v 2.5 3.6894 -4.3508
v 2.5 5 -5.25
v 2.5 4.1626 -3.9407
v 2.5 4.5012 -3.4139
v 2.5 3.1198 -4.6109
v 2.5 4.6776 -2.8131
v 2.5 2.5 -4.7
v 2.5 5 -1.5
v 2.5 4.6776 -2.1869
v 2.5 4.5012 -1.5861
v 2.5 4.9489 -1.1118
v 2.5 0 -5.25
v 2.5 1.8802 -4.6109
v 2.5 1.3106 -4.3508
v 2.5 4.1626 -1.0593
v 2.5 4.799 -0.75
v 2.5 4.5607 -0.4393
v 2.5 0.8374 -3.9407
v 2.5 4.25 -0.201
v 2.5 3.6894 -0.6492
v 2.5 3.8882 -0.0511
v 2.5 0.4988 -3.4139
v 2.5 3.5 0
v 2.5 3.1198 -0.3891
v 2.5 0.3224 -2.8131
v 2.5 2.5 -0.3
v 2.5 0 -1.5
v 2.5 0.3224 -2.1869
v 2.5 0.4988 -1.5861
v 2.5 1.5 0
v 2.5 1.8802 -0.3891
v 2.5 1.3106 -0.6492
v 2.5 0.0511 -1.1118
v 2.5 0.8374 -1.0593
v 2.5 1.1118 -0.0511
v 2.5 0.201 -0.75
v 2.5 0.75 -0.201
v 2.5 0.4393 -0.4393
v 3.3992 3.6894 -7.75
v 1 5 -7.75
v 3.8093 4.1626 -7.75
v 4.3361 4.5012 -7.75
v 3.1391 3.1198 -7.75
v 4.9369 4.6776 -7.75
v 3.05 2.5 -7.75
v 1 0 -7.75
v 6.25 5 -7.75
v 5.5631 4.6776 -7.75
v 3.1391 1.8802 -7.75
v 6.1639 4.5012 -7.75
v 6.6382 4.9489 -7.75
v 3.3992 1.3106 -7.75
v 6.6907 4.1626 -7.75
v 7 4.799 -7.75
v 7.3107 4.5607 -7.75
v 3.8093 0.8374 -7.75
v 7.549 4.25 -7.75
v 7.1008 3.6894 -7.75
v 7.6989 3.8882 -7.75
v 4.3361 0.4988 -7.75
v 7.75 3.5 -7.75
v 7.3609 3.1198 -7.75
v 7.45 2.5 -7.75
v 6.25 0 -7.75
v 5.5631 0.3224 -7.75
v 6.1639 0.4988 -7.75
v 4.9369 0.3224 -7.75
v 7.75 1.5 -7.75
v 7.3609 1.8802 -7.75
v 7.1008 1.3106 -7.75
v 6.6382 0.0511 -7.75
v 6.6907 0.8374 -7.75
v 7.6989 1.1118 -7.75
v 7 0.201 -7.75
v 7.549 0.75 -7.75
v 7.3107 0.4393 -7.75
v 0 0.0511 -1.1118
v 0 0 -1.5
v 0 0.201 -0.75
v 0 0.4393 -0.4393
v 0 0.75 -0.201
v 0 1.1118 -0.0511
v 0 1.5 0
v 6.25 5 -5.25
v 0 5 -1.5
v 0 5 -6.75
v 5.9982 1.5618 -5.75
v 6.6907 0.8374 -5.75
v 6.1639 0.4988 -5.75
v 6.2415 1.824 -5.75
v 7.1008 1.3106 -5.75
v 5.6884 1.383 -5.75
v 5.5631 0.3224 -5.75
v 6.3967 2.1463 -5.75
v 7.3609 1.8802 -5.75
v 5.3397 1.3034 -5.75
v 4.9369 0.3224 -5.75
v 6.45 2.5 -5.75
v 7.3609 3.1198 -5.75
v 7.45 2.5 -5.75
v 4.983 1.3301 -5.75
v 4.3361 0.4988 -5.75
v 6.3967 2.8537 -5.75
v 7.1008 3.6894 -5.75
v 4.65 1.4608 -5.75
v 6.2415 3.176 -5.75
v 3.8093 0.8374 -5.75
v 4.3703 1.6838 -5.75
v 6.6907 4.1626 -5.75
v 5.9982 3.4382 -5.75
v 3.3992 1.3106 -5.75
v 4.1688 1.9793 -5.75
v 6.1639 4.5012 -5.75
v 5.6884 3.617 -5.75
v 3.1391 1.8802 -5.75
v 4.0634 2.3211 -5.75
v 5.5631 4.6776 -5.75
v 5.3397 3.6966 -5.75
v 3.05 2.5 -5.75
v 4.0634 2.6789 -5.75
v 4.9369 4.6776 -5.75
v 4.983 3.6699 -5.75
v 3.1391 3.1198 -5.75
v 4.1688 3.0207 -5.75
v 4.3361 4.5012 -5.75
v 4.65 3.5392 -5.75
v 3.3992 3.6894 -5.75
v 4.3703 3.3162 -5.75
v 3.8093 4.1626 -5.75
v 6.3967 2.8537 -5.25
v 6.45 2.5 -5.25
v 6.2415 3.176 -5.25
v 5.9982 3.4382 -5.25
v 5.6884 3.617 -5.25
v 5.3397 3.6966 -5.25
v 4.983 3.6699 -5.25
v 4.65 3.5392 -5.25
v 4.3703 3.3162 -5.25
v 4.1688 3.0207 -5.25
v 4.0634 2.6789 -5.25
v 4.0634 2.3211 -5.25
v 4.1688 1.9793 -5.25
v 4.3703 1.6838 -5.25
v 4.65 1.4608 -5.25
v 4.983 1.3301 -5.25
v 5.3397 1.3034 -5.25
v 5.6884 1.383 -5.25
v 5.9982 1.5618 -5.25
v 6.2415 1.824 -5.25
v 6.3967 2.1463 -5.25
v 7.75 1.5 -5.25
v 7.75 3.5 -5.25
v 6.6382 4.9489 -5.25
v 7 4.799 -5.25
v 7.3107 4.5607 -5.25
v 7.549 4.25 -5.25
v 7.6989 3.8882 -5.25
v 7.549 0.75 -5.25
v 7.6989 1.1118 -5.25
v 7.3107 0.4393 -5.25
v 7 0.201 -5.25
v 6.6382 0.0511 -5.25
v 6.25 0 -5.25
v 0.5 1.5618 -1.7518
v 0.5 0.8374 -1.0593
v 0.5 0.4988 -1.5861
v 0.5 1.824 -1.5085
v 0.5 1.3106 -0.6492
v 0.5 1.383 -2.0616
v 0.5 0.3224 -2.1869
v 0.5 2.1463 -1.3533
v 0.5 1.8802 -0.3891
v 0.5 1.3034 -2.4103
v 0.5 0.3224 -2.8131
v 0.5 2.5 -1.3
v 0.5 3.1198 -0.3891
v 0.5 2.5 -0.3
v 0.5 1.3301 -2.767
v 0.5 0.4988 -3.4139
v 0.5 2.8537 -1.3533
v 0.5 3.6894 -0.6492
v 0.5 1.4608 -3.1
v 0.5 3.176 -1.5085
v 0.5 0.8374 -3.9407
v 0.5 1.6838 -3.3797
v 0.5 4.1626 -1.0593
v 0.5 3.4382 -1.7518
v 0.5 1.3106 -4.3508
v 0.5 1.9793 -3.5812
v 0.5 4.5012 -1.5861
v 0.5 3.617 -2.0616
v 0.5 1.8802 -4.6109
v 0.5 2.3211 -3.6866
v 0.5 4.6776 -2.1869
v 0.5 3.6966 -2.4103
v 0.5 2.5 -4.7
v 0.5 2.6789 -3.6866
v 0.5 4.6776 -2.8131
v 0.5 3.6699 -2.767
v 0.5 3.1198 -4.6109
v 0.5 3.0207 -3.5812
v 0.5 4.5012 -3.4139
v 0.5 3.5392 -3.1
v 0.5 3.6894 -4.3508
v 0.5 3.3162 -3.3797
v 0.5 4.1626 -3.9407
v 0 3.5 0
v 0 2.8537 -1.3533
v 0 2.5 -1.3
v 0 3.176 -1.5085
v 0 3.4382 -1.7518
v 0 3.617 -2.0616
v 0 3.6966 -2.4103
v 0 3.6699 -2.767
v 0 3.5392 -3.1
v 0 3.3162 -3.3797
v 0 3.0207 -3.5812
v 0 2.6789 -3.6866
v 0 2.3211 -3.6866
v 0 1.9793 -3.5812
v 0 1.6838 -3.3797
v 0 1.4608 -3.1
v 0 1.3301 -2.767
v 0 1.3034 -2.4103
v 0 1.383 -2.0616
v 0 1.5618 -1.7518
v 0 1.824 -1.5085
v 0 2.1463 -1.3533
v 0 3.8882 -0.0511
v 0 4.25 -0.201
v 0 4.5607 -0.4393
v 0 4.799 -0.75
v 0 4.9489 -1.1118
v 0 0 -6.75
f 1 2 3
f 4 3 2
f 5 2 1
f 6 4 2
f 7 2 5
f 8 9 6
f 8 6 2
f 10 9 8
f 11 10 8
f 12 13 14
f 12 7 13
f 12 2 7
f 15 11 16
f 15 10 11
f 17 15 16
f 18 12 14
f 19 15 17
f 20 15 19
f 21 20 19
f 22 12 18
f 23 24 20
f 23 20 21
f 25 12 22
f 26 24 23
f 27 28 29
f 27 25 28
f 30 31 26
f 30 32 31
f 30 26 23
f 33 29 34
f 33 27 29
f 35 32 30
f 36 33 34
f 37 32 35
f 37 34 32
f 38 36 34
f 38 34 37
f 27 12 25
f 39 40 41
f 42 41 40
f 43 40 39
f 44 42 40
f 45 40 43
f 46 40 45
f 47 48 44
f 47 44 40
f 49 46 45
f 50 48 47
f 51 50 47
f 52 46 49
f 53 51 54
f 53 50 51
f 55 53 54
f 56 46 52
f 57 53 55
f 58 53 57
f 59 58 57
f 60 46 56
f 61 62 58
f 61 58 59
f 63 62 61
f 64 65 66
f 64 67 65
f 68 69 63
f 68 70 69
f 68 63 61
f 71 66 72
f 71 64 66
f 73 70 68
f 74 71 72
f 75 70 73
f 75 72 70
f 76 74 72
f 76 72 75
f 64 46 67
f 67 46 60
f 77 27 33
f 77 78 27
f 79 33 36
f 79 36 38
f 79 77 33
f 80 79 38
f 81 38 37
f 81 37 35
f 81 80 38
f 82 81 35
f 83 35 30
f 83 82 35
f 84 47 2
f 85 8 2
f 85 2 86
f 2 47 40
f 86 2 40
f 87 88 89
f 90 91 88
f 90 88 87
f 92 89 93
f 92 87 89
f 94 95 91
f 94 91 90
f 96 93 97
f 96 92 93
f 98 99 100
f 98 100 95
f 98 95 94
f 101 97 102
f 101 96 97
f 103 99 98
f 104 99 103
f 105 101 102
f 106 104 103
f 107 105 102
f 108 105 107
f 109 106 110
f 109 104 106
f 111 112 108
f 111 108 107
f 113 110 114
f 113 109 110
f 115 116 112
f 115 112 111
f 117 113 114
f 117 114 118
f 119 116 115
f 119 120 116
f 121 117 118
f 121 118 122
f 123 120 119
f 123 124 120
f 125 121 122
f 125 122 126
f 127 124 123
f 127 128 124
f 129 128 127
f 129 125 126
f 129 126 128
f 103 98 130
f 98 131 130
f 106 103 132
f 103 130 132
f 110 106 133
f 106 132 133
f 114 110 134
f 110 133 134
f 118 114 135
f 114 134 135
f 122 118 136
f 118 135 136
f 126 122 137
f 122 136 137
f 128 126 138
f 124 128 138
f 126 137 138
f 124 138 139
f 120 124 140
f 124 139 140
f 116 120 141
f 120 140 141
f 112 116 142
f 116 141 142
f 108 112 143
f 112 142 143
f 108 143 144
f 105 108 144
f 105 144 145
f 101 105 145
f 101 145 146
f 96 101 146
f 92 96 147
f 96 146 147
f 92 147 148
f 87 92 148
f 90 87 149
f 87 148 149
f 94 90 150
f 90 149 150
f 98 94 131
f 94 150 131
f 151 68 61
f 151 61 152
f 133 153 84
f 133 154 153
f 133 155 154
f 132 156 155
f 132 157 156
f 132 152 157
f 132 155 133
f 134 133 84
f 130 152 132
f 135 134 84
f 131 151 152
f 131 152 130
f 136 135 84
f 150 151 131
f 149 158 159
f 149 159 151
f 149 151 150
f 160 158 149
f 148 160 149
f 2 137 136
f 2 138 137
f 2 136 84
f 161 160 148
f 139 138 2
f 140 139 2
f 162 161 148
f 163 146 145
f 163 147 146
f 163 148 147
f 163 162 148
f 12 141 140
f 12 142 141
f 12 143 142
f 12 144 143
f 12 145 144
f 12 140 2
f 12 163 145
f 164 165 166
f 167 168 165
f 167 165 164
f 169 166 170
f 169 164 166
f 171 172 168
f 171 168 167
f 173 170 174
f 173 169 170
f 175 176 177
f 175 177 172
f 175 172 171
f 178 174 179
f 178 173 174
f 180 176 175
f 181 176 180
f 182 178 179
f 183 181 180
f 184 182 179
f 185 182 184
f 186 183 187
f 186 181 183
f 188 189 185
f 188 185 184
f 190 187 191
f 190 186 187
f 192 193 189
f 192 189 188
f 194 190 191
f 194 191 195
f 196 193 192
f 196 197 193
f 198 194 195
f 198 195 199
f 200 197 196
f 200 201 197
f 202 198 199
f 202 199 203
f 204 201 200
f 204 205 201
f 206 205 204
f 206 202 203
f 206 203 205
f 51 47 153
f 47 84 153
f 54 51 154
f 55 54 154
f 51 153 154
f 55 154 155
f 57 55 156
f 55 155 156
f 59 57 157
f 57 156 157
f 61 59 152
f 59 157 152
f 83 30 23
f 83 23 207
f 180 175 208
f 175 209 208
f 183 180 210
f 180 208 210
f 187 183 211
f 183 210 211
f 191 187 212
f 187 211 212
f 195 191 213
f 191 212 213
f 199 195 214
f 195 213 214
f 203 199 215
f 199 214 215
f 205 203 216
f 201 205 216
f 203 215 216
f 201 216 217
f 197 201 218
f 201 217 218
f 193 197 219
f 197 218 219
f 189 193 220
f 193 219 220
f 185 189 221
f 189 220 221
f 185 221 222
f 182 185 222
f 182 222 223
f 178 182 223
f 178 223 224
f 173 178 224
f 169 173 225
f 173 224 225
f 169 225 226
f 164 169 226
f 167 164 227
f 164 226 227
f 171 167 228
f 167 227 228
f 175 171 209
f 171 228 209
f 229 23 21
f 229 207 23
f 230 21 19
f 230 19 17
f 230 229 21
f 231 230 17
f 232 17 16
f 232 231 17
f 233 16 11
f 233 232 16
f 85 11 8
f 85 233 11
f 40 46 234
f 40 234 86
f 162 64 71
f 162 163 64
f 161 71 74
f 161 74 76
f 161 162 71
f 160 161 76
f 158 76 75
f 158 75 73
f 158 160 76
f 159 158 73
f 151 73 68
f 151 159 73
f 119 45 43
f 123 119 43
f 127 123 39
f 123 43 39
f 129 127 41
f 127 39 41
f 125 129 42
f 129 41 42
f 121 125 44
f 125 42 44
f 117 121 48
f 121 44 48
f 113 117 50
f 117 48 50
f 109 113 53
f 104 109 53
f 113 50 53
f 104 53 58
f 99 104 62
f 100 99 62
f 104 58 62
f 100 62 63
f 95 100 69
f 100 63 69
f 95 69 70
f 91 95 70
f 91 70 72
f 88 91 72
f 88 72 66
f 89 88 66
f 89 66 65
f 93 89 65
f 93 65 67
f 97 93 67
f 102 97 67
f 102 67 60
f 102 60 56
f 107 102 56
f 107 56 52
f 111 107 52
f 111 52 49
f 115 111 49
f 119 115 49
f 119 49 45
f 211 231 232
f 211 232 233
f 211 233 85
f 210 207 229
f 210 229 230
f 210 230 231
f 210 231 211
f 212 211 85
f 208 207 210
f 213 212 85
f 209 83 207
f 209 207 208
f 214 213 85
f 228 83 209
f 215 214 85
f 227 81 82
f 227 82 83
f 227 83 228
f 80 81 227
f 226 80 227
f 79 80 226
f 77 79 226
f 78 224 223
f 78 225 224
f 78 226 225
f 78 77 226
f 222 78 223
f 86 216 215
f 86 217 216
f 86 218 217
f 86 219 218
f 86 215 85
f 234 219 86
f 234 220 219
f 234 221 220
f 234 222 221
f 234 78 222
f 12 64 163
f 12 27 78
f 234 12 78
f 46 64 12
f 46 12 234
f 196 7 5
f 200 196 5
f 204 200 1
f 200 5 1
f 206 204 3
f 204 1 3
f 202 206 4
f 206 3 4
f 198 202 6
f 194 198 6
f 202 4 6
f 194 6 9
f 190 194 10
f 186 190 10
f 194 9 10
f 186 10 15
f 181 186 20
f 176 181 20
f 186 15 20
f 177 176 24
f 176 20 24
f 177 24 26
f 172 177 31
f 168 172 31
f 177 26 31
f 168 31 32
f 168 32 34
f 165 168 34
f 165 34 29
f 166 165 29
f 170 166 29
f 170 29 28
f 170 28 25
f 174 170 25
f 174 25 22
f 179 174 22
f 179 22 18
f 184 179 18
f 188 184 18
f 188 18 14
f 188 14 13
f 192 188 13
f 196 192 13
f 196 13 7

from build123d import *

# Parameters (mm, degrees)
BOSS_EXTRUDE2_DEPTH            = 5
CHAMFER1_SIZE                  = 1
CBORE_FOR_M2_SHCS1_D           = 2.4
CBORE_FOR_M2_SHCS1_CBORE_D     = 4.4
CBORE_FOR_M2_SHCS1_CBORE_DEPTH = 2
FILLET2_R                      = 1.5
CBORE_FOR_M2_SHCS3_D           = 2.4
CBORE_FOR_M2_SHCS3_CBORE_D     = 4.4
CBORE_FOR_M2_SHCS3_CBORE_DEPTH = 2


with BuildPart() as part:
    # Sketch1 → Boss-Extrude2 (new body)
    with BuildSketch(Plane(origin=(0, 0, 0), x_dir=(1, 0, 0), z_dir=(0, 1, 0))):
        Polygon((0, 0), (0, 7.75), (7.75, 7.75), (7.75, 5.25), (2.5, 5.25), (2.5, 0), align=None)
    extrude(amount=BOSS_EXTRUDE2_DEPTH)

    # Chamfer1
    chamfer1_edges = [part.edges().sort_by_distance(p)[0] for p in [
        (0, 2.5, -7.75),
    ]]
    chamfer(chamfer1_edges, length=CHAMFER1_SIZE)

    # CBORE for M2 SHCS1 (through all)
    with Locations(Plane(origin=(0, 0, -7.75), x_dir=(-1, 0, 0), z_dir=(0, 0, -1))):
        with Locations((-5.25, 2.5)):
            CounterBoreHole(CBORE_FOR_M2_SHCS1_D / 2, CBORE_FOR_M2_SHCS1_CBORE_D / 2, CBORE_FOR_M2_SHCS1_CBORE_DEPTH)

    # Fillet2
    fillet2_edges = [part.edges().sort_by_distance(p)[0] for p in [
        (7.75, 5, -6.5),
        (1.25, 5, 0),
        (7.75, 0, -6.5),
        (1.25, 0, 0),
    ]]
    fillet(fillet2_edges, radius=FILLET2_R)

    # CBORE for M2 SHCS3 (through all)
    with Locations(Plane(origin=(2.5, 0, 0), x_dir=(0, 0, -1), z_dir=(1, 0, 0))):
        with Locations((2.5, 2.5)):
            CounterBoreHole(CBORE_FOR_M2_SHCS3_D / 2, CBORE_FOR_M2_SHCS3_CBORE_D / 2, CBORE_FOR_M2_SHCS3_CBORE_DEPTH)


solid = part.part
